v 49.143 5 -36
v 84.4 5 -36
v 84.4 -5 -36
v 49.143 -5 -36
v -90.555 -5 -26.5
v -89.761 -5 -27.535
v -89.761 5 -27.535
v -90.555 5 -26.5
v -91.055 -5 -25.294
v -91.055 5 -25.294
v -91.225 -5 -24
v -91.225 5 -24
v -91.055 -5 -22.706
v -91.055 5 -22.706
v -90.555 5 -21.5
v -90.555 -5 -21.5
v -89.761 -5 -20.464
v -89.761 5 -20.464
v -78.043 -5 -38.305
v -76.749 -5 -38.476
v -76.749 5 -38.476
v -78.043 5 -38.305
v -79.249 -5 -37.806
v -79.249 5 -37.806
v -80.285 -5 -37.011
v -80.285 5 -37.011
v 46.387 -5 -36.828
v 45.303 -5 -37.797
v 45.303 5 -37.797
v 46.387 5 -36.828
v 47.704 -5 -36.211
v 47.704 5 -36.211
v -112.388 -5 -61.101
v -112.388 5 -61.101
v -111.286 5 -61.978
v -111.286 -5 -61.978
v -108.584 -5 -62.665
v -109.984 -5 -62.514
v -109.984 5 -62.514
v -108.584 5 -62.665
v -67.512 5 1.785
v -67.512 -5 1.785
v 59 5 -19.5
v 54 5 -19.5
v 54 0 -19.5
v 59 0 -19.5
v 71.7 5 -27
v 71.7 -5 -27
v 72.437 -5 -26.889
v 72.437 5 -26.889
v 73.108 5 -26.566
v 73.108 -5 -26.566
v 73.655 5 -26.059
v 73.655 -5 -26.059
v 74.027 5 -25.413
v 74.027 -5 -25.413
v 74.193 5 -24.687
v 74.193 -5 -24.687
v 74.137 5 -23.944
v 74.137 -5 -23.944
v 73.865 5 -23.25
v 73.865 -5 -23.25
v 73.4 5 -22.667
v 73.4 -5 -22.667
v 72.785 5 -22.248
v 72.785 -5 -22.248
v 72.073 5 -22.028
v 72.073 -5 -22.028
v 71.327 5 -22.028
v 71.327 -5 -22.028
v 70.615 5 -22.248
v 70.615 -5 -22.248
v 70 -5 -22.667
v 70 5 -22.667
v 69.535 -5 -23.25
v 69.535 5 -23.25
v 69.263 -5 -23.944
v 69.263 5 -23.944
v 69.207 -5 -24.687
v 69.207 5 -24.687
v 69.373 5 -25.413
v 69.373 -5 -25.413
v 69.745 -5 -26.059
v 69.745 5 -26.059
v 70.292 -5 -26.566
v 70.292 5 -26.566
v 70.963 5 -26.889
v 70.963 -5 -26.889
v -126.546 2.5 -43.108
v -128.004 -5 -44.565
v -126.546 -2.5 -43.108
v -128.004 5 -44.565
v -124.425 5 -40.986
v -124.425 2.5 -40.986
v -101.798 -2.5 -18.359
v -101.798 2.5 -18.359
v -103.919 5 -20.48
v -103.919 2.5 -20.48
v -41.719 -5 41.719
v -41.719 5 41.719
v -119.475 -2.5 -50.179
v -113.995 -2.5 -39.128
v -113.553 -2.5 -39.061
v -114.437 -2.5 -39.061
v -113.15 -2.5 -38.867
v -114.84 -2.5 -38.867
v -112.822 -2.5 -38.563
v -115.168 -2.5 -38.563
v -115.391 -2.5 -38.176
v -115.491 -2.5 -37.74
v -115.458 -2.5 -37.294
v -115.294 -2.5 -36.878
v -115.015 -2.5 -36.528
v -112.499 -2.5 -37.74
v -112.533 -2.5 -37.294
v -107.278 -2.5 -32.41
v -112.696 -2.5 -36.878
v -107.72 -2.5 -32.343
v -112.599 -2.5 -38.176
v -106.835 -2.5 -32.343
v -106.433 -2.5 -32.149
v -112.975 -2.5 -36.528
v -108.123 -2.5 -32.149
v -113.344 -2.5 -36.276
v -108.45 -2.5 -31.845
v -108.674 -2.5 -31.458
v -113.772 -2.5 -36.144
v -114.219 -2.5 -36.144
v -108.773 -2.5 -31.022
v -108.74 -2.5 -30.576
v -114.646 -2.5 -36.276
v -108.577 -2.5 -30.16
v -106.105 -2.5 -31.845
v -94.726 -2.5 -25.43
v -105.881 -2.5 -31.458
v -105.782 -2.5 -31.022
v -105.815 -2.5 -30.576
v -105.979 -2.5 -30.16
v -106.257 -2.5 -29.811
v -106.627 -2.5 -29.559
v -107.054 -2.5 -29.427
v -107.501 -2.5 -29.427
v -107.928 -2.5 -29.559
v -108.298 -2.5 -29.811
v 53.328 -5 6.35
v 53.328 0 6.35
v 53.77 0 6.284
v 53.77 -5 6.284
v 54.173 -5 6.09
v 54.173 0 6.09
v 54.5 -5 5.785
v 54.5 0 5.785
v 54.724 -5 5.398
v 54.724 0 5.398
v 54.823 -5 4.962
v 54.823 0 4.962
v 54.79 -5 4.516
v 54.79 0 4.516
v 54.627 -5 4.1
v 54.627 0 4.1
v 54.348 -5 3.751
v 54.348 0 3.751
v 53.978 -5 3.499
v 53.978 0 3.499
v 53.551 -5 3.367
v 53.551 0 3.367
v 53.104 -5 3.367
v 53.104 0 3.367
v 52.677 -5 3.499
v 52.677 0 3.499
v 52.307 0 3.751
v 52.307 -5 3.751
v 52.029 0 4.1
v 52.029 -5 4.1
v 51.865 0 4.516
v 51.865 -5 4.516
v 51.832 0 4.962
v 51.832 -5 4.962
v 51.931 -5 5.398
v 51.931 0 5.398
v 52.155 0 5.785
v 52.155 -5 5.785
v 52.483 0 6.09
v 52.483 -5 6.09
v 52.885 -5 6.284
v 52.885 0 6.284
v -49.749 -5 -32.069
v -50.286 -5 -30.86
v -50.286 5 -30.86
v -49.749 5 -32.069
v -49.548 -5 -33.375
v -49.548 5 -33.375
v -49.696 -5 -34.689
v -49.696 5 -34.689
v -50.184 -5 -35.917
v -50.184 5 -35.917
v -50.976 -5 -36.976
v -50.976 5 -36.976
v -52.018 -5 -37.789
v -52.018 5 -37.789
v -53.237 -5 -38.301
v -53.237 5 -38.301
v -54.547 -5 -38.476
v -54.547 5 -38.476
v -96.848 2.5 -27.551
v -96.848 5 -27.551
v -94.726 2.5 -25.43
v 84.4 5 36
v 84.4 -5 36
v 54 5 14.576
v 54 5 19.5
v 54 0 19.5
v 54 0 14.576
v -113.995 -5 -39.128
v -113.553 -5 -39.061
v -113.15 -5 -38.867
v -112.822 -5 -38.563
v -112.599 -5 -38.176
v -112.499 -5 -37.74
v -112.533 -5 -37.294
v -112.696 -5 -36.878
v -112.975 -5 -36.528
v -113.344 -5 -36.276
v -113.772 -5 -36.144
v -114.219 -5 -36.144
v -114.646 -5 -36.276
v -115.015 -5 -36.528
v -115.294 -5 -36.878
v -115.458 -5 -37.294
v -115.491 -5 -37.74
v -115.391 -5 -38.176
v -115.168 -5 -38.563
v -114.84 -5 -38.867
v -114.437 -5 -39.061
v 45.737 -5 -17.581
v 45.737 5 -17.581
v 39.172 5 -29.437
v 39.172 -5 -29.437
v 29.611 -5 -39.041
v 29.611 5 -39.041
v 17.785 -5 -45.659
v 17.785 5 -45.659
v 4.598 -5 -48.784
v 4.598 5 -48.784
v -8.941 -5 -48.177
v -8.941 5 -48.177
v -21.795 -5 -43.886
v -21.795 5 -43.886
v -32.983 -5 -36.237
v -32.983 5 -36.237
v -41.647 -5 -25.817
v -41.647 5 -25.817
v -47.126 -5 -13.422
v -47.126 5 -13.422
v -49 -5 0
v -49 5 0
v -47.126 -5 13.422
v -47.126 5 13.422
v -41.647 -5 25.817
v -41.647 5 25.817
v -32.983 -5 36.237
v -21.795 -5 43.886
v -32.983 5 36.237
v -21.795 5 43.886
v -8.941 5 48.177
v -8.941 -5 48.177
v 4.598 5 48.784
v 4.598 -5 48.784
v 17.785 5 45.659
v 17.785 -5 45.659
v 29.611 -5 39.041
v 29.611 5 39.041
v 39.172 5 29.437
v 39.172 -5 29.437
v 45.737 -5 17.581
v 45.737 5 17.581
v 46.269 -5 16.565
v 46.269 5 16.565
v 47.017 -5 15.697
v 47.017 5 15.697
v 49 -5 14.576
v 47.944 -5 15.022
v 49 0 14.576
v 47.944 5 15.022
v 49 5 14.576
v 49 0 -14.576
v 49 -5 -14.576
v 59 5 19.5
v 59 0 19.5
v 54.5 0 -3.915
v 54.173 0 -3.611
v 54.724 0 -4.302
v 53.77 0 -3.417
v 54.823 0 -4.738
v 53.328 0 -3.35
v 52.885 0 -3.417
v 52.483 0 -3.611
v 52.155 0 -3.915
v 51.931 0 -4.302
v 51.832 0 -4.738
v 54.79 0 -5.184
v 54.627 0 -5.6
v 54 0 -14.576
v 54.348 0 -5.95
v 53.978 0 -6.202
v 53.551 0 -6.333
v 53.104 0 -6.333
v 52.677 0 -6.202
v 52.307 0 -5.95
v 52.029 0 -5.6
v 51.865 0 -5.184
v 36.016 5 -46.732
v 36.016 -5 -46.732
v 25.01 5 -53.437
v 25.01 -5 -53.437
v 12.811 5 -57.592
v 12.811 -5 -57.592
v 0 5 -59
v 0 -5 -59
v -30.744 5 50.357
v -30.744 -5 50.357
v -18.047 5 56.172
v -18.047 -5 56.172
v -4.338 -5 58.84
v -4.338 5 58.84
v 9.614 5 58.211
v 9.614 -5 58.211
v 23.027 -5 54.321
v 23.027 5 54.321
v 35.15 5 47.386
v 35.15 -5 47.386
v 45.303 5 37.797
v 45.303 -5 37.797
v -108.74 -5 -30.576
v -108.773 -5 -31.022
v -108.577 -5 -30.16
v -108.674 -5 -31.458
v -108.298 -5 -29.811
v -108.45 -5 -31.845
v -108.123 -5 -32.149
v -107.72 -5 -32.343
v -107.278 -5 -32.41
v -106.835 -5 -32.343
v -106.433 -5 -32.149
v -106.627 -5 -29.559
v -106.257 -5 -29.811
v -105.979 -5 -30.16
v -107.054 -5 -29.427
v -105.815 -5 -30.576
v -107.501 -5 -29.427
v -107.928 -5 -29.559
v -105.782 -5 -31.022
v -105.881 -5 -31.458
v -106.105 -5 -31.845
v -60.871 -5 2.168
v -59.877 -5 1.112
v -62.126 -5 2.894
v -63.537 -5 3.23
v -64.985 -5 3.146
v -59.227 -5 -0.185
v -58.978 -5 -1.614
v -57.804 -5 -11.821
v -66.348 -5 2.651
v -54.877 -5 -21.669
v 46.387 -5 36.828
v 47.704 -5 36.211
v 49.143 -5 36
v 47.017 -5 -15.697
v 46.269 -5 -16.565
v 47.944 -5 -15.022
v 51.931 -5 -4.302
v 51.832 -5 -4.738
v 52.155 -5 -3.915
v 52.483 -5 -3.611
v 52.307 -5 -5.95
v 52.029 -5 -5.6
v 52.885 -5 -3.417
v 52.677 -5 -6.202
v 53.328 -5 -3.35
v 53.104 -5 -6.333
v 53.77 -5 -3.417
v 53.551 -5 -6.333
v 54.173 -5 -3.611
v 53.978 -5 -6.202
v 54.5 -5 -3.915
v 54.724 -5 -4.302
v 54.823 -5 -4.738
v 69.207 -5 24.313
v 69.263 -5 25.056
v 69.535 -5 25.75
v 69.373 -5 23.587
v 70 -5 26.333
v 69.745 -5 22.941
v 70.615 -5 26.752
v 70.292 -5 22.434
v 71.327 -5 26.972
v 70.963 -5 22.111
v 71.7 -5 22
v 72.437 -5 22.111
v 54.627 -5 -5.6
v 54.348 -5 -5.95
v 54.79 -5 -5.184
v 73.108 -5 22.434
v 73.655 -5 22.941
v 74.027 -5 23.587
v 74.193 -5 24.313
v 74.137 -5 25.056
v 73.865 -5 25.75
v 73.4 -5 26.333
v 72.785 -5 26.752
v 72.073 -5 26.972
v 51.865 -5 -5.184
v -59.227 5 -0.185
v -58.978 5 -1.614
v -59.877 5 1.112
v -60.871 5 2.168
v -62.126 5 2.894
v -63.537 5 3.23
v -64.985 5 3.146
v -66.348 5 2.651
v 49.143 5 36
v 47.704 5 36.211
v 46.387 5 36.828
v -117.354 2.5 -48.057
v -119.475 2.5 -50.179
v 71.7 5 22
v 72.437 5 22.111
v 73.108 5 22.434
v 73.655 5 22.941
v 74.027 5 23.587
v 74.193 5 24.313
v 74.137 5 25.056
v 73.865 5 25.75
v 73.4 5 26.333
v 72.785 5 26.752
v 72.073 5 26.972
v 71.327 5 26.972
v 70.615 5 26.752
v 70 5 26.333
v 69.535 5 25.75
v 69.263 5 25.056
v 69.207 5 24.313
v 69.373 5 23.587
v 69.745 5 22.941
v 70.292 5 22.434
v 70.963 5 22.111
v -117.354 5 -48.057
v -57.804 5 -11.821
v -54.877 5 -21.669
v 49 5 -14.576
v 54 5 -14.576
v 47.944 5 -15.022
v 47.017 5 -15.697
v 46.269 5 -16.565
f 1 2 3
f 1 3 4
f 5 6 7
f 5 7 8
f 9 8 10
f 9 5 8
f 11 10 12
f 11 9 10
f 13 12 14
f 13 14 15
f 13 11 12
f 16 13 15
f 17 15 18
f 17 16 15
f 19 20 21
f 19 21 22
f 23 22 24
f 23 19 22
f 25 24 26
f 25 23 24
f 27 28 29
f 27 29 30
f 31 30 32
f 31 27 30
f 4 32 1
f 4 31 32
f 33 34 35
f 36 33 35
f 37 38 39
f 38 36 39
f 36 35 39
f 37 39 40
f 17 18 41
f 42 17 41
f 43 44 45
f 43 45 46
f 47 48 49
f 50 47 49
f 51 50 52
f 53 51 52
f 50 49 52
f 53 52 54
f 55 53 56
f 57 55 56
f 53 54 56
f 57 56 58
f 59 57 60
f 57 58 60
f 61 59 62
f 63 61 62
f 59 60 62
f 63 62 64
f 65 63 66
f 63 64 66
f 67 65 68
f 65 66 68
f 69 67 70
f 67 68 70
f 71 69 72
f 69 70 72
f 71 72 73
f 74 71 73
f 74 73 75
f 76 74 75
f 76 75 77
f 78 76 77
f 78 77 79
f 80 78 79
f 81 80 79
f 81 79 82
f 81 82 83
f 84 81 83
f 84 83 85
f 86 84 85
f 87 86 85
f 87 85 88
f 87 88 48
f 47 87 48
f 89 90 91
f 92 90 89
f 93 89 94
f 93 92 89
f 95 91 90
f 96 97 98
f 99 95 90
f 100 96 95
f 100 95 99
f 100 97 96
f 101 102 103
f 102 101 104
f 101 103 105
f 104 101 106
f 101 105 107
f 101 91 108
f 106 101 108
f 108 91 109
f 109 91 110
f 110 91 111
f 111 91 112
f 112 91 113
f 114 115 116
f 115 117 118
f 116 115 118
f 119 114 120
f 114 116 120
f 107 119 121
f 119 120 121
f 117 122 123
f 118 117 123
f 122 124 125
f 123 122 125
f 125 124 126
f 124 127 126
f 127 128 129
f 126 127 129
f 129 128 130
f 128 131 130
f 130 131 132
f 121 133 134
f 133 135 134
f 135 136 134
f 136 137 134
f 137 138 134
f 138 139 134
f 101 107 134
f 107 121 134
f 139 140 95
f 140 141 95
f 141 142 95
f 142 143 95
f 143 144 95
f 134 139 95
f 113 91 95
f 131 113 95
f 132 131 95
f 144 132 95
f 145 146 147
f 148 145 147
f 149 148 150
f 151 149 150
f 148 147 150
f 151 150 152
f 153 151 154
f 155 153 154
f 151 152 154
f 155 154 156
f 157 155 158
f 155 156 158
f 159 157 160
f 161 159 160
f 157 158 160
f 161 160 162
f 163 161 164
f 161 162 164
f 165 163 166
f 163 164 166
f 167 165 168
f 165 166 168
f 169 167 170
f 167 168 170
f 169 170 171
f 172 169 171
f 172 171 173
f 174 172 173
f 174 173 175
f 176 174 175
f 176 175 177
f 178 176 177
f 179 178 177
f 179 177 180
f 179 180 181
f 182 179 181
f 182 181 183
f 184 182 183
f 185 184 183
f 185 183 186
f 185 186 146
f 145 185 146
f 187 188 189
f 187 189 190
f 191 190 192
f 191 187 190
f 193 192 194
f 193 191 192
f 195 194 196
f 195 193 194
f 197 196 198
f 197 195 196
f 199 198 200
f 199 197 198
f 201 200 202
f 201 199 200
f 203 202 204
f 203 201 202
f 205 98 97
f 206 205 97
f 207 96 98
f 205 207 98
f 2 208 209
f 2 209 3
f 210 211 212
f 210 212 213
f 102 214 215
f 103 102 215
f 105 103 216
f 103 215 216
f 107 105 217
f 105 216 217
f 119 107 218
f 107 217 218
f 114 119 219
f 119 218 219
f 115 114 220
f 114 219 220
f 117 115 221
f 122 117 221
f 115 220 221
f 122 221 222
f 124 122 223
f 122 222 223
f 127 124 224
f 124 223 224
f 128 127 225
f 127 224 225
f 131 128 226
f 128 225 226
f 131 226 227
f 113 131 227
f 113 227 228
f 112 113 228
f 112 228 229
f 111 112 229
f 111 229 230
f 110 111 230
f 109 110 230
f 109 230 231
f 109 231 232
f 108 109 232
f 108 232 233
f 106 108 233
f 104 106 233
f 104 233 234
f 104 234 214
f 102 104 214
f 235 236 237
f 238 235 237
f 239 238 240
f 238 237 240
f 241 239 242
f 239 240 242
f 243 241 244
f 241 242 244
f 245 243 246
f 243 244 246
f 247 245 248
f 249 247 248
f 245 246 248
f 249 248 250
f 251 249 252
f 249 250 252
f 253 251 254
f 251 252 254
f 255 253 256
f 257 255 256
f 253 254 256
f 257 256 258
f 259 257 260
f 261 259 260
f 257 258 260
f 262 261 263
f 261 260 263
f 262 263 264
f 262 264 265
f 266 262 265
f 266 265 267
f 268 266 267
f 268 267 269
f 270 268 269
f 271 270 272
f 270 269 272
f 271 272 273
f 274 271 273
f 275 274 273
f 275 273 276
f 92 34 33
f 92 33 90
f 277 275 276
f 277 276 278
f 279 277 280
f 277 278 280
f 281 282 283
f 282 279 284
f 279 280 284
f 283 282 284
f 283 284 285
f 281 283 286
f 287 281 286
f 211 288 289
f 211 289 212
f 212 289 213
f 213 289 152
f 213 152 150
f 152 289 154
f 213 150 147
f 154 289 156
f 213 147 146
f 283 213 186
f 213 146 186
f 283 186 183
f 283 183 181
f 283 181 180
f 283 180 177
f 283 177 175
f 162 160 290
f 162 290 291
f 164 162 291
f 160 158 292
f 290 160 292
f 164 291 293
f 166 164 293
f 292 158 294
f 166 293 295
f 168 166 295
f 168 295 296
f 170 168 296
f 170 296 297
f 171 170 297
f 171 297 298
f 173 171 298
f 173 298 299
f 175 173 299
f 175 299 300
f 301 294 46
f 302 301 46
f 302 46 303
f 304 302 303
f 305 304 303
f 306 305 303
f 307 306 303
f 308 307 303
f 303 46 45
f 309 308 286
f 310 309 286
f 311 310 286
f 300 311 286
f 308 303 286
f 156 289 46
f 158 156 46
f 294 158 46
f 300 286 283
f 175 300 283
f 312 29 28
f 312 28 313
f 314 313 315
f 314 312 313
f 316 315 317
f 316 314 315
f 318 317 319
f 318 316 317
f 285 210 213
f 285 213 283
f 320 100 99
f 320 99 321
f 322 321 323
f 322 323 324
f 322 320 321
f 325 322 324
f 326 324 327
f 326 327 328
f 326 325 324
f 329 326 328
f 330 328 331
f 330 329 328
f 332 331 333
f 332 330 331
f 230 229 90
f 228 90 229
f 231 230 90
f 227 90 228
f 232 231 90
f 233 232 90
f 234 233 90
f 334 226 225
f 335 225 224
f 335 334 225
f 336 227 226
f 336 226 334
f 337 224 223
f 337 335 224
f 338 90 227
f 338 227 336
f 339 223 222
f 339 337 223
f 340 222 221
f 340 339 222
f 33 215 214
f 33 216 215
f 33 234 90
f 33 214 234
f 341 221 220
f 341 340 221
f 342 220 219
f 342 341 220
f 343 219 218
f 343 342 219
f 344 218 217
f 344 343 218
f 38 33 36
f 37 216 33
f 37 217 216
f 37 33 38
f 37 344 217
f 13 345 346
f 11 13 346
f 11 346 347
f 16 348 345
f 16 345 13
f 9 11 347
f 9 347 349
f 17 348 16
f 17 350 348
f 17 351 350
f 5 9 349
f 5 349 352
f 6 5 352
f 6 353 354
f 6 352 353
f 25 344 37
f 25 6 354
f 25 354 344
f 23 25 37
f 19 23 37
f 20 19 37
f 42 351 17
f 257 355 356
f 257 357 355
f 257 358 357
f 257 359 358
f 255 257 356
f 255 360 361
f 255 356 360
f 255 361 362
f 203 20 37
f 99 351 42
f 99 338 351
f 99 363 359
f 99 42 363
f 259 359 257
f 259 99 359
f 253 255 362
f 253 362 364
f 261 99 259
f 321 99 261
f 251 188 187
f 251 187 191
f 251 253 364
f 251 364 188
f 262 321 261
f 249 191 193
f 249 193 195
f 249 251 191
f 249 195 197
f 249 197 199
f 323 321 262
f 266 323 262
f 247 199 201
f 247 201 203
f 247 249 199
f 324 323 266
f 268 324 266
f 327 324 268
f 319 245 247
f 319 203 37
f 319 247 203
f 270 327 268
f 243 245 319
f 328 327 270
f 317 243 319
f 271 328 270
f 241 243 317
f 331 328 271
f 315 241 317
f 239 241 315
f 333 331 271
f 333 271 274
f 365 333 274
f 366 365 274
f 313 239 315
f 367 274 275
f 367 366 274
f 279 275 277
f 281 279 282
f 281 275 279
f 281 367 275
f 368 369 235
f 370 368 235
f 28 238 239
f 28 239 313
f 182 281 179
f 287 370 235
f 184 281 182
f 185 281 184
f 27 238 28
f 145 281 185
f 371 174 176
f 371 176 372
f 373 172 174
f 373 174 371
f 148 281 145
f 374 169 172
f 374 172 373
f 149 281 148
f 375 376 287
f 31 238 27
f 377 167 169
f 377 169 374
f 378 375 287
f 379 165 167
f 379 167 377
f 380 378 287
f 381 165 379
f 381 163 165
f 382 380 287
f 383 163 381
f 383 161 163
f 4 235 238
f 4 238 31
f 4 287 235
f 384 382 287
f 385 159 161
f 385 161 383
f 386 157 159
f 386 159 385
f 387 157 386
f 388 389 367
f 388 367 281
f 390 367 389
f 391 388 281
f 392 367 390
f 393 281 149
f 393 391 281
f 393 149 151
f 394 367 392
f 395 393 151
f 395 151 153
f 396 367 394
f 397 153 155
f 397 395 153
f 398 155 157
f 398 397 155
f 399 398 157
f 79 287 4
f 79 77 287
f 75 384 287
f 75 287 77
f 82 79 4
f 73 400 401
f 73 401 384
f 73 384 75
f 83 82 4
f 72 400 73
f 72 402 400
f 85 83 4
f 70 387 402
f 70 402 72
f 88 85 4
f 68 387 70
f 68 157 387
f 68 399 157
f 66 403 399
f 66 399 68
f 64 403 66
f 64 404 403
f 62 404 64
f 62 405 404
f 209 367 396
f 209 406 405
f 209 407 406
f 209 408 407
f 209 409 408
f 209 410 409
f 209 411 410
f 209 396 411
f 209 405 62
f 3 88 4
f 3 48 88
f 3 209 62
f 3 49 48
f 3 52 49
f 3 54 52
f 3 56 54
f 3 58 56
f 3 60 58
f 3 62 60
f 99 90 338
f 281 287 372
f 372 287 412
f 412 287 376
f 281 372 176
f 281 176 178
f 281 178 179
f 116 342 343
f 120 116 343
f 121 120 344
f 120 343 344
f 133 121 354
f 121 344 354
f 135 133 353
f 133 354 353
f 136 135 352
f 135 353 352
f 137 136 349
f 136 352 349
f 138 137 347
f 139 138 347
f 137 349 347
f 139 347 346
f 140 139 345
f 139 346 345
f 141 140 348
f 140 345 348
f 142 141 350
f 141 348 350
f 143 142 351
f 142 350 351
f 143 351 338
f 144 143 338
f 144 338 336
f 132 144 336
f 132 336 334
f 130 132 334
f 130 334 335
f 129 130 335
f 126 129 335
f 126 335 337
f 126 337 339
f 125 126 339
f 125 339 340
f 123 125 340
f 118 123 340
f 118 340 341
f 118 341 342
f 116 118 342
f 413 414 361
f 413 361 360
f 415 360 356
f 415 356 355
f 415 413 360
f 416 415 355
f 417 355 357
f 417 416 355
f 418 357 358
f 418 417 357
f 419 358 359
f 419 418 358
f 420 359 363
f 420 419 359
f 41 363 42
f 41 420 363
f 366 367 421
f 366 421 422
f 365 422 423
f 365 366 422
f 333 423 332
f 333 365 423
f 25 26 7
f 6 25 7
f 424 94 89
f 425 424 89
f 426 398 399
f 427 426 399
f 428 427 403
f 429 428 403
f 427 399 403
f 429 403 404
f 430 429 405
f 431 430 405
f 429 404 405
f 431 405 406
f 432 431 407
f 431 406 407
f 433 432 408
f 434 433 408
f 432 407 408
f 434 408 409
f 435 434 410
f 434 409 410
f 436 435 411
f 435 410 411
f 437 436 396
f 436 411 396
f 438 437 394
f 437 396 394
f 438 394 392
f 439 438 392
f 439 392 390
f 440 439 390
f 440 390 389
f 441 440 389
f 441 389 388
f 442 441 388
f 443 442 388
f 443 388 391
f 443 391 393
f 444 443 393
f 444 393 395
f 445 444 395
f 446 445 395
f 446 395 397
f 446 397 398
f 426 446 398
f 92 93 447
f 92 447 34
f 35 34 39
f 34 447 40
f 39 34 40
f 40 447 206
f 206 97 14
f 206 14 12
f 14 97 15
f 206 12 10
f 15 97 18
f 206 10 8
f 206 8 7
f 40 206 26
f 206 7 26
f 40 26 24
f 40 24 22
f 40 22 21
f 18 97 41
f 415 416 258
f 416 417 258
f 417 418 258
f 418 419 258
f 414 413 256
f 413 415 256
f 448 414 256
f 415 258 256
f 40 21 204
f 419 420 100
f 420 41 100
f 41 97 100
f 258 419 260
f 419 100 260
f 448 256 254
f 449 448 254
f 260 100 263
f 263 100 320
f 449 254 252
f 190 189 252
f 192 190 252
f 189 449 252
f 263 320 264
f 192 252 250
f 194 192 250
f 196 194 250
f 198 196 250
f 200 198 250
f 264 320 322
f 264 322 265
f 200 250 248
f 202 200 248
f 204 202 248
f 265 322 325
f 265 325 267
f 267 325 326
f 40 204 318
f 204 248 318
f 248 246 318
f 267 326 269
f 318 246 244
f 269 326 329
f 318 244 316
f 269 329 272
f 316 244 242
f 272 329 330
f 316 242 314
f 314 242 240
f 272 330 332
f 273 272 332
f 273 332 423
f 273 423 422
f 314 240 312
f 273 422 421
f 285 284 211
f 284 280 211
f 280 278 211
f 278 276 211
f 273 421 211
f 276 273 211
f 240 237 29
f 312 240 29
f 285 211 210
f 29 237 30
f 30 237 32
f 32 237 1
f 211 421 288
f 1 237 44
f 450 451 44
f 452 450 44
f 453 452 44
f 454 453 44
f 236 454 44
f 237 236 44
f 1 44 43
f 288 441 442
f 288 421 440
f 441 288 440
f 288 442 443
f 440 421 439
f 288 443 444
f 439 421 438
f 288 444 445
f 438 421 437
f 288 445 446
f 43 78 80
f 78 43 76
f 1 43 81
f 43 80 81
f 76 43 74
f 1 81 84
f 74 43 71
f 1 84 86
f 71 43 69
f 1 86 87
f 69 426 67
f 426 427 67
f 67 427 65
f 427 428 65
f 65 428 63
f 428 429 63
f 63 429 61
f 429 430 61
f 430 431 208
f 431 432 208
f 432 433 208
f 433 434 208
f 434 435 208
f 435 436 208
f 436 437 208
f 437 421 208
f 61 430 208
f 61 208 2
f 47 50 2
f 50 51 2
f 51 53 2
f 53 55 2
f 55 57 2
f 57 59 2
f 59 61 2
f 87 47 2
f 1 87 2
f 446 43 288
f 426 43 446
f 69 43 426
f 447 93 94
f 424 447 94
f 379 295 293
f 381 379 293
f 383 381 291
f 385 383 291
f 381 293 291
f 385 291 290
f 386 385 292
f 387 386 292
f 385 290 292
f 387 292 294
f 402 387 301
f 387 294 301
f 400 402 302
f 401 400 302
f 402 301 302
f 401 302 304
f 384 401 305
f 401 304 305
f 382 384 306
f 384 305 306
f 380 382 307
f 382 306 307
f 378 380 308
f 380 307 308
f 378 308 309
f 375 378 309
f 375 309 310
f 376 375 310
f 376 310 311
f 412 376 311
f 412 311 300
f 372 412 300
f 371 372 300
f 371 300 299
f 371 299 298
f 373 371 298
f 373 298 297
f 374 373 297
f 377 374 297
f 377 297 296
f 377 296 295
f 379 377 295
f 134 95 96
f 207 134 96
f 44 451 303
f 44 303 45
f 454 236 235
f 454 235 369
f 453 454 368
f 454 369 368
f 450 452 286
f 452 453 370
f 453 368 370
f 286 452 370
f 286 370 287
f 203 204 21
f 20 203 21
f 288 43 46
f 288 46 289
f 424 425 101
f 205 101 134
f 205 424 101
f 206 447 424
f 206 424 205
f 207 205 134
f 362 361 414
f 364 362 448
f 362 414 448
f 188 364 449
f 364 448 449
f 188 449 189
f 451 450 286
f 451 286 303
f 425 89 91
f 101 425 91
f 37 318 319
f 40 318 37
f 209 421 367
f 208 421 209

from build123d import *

# Parameters (mm, degrees)
BOSS_EXTRUDE1_DEPTH         = 5
FILLET1_R                   = 5
CUT_EXTRUDE1_DEPTH          = 10
F_3_0MM_DOWEL_HOLE3_D       = 3
CUT_EXTRUDE2_DEPTH          = 5
F_3_0MM_PRESS_DOWEL_HOLE1_D = 3
F_5_0MM_PRESS_DOWEL_HOLE1_D = 5


with BuildPart() as part:
    # Sketch1 → Boss-Extrude1 (new, symmetric)
    with BuildSketch(Plane(origin=(0, 0, 0), x_dir=(1, 0, 0), z_dir=(0, 1, 0))):
        with BuildLine():
            Line((-107.462553071, 24.023952891), (-41.71930009, -41.71930009))
            ThreePointArc((-41.71930009, -41.71930009), (3.806502253, -58.877079926), (46.74398357, -36))
            Line((46.74398357, -36), (84.4, -36))
            Line((84.4, -36), (84.4, 36))
            Line((84.4, 36), (46.74398357, 36))
            ThreePointArc((46.74398357, 36), (26.048032555, 52.93864373), (0, 59))
            Line((0, 59), (-110.83863918, 62.740943777))
            Line((-110.83863918, 62.740943777), (-128.004005064, 44.565404884))
            Line((-128.004005064, 44.565404884), (-107.462553071, 24.023952891))
        make_face()
        with BuildLine():
            Line((49, 14.576290822), (46.781745862, 14.576290822))
            ThreePointArc((46.781745862, 14.576290822), (-49, 0), (46.781745862, -14.576290822))
            Line((46.781745862, -14.576290822), (49, -14.576290822))
            Line((49, -14.576290822), (49, 14.576290822))
        make_face(mode=Mode.SUBTRACT)
        with BuildLine():
            Line((-93.296148974, 23.999684418), (-57.886132355, -11.410332201))
            ThreePointArc((-57.886132355, -11.410332201), (-57.048958802, 15.047135926), (-44.728269399, 38.475731527))
            Line((-44.728269399, 38.475731527), (-78.820101865, 38.475731527))
            Line((-78.820101865, 38.475731527), (-93.296148974, 23.999684418))
        make_face(mode=Mode.SUBTRACT)
    extrude(amount=BOSS_EXTRUDE1_DEPTH, both=True)

    # Fillet1
    # the kernel refuses this fillet: 5 mm, written as the material it adds along each edge
    with BuildSketch(Plane(origin=(46.74398357, -5, 36), x_dir=(1, 0, 0), z_dir=(0, 1, 0))) as fillet1_piece_1:
        with BuildLine():
            CenterArc((2.398665931, -5), FILLET1_R, 90, 50.161560023)
            ThreePointArc((-1.440603561, -1.796875), (-0.711533327, -0.905467408), (0, 0))
            Line((0, 0), (2.398665931, 0))
        make_face()
    extrude(amount=10)
    with BuildSketch(Plane(origin=(46.74398357, -5, -36), x_dir=(-0.6255163967442842, 0, -0.7802110210731757), z_dir=(0, 1, 0))) as fillet1_piece_2:
        with BuildLine():
            CenterArc((2.400650235, -4.999047579), FILLET1_R, 91.118340331, 50.161560023)
            Line((-1.50040487, -1.871465595), (0, 0))
            ThreePointArc((0, 0), (1.151531414, -0.011238567), (2.303062827, 0))
        make_face()
    extrude(amount=10)
    with BuildSketch(Plane(origin=(-93.296148974, -5, -23.999684418), x_dir=(0.7071067811865481, 0, -0.7071067811865468), z_dir=(0, 1, 0))) as fillet1_piece_3:
        with BuildLine():
            CenterArc((FILLET1_R, -FILLET1_R), FILLET1_R, 90, 90)
            Line((0, -FILLET1_R), (0, 0))
            Line((0, 0), (FILLET1_R, 0))
        make_face()
    extrude(amount=10)
    with BuildSketch(Plane(origin=(-78.820101865, -5, -38.475731527), x_dir=(1, 0, 0), z_dir=(0, 1, 0))) as fillet1_piece_4:
        with BuildLine():
            CenterArc((FILLET1_R * 0.414213562373, -FILLET1_R), FILLET1_R, 90, 45)
            Line((-FILLET1_R * 0.292893218813, -FILLET1_R * 0.292893218813), (0, 0))
            Line((0, 0), (FILLET1_R * 0.414213562373, 0))
        make_face()
    extrude(amount=10)
    with BuildSketch(Plane(origin=(-57.886132355, 5, 11.410332201), x_dir=(-0.08353472888006676, 0, -0.9965048665565731), z_dir=(0, -1, 0))) as fillet1_piece_5:
        with BuildLine():
            CenterArc((13.623707644, -4.969234882), FILLET1_R, 96.359234778, 133.432536558)
            Line((10.395870767, -8.787751491), (0, 0))
            ThreePointArc((0, 0), (6.534949195, -0.363028395), (13.06989839, 0))
        make_face()
    extrude(amount=10)
    with BuildSketch(Plane(origin=(-44.728269399, -5, -38.475731527), x_dir=(-0.5894789818981541, 0, 0.807783714802617), z_dir=(0, 1, 0))) as fillet1_piece_6:
        with BuildLine():
            CenterArc((9.826854917, -4.984017175), FILLET1_R, 94.582422839, 121.53762105)
            Line((5.787936343, -7.931412084), (0, 0))
            ThreePointArc((0, 0), (4.713694635, -0.18859734), (9.42738927, 0))
        make_face()
    extrude(amount=10)
    # the kernel refuses this fillet: 5 mm, written as the material it takes off along each edge
    with BuildSketch(Plane(origin=(46.781745862, 12.95259813, 14.576290822), x_dir=(-0.32830869078175484, 0, 0.9445704862831413), z_dir=(0, -1, 0)), Plane(origin=(46.781745862, -12.95259813, -14.576290822), x_dir=(-0.32830869078175745, 0, -0.9445704862831404), z_dir=(0, 1, 0))) as fillet1_2_piece_1:
        with BuildLine():
            CenterArc((3.343337173, -4.997365244), FILLET1_R, 91.860123923, 52.660239811)
            Line((-0.728272112, -2.09529739), (0, 0))
            ThreePointArc((0, 0), (1.590519626, -0.025820606), (3.181039252, 0))
        make_face()
    extrude(amount=25.90519626, mode=Mode.SUBTRACT)
    with BuildSketch(Plane(origin=(-110.83863918, 10.640073082, -62.740943777), x_dir=(-0.6866146353868613, 0, 0.7270215557138366), z_dir=(0, -1, 0))) as fillet1_2_piece_2:
        with BuildLine():
            CenterArc((FILLET1_R * 0.451205846565, -FILLET1_R), FILLET1_R, 90, 48.570349235)
            Line((-FILLET1_R * 0.298562891452, -FILLET1_R * 0.338300038165), (0, 0))
            Line((0, 0), (FILLET1_R * 0.451205846565, 0))
        make_face()
    extrude(amount=21.280146164, mode=Mode.SUBTRACT)

    # Sketch11 → Cut-Extrude1 (cut)
    with BuildSketch(Plane(origin=(-41.71930009, 0, 41.71930009), x_dir=(0.7071067811865458, 0, 0.7071067811865492), z_dir=(-0.7071067811865492, 0, 0.7071067811865458))):
        Polygon((-116.963470882, 5), (-116.963470882, 2.5), (-119.963470882, 2.5), (-119.963470882, -2.5), (-84.963470882, -2.5), (-84.963470882, 2.5), (-87.963470882, 2.5), (-87.963470882, 5), align=None)
    extrude(amount=-CUT_EXTRUDE1_DEPTH, mode=Mode.SUBTRACT)

    # Ø3.0mm Dowel Hole3 (through all)
    with Locations(Plane(origin=(-113.995138479, -2.5, -37.627606111), x_dir=(0, 0, 1), z_dir=(0, 1, 0))):
        with Locations((0, 0), (6.717514421, 6.717514421)):
            Hole(F_3_0MM_DOWEL_HOLE3_D / 2)

    # Sketch33 → Cut-Extrude2 (cut)
    with BuildSketch(Plane(origin=(0, 5, 0), x_dir=(1, 0, 0), z_dir=(0, 1, 0))):
        Polygon((59, 19.5), (59, -19.5), (54, -19.5), (54, -14.576290822), (49, -14.576290822), (49, 14.576290822), (54, 14.576290822), (54, 19.5), align=None)
    extrude(amount=-CUT_EXTRUDE2_DEPTH, mode=Mode.SUBTRACT)

    # Ø3.0mm Press Dowel Hole1 (through all)
    with Locations(Plane(origin=(53.32762779, -5, -4.850211912), x_dir=(0, 0, -1), z_dir=(0, -1, 0))):
        with Locations((0, 0), (-9.700423824, 0)):
            Hole(F_3_0MM_PRESS_DOWEL_HOLE1_D / 2)

    # Ø5.0mm Press Dowel Hole1 (through all)
    with Locations(Plane(origin=(71.7, 5, 24.5), x_dir=(0, 0, 1), z_dir=(0, 1, 0))):
        with Locations((0, 0), (-49, 0)):
            Hole(F_5_0MM_PRESS_DOWEL_HOLE1_D / 2)


solid = part.part
